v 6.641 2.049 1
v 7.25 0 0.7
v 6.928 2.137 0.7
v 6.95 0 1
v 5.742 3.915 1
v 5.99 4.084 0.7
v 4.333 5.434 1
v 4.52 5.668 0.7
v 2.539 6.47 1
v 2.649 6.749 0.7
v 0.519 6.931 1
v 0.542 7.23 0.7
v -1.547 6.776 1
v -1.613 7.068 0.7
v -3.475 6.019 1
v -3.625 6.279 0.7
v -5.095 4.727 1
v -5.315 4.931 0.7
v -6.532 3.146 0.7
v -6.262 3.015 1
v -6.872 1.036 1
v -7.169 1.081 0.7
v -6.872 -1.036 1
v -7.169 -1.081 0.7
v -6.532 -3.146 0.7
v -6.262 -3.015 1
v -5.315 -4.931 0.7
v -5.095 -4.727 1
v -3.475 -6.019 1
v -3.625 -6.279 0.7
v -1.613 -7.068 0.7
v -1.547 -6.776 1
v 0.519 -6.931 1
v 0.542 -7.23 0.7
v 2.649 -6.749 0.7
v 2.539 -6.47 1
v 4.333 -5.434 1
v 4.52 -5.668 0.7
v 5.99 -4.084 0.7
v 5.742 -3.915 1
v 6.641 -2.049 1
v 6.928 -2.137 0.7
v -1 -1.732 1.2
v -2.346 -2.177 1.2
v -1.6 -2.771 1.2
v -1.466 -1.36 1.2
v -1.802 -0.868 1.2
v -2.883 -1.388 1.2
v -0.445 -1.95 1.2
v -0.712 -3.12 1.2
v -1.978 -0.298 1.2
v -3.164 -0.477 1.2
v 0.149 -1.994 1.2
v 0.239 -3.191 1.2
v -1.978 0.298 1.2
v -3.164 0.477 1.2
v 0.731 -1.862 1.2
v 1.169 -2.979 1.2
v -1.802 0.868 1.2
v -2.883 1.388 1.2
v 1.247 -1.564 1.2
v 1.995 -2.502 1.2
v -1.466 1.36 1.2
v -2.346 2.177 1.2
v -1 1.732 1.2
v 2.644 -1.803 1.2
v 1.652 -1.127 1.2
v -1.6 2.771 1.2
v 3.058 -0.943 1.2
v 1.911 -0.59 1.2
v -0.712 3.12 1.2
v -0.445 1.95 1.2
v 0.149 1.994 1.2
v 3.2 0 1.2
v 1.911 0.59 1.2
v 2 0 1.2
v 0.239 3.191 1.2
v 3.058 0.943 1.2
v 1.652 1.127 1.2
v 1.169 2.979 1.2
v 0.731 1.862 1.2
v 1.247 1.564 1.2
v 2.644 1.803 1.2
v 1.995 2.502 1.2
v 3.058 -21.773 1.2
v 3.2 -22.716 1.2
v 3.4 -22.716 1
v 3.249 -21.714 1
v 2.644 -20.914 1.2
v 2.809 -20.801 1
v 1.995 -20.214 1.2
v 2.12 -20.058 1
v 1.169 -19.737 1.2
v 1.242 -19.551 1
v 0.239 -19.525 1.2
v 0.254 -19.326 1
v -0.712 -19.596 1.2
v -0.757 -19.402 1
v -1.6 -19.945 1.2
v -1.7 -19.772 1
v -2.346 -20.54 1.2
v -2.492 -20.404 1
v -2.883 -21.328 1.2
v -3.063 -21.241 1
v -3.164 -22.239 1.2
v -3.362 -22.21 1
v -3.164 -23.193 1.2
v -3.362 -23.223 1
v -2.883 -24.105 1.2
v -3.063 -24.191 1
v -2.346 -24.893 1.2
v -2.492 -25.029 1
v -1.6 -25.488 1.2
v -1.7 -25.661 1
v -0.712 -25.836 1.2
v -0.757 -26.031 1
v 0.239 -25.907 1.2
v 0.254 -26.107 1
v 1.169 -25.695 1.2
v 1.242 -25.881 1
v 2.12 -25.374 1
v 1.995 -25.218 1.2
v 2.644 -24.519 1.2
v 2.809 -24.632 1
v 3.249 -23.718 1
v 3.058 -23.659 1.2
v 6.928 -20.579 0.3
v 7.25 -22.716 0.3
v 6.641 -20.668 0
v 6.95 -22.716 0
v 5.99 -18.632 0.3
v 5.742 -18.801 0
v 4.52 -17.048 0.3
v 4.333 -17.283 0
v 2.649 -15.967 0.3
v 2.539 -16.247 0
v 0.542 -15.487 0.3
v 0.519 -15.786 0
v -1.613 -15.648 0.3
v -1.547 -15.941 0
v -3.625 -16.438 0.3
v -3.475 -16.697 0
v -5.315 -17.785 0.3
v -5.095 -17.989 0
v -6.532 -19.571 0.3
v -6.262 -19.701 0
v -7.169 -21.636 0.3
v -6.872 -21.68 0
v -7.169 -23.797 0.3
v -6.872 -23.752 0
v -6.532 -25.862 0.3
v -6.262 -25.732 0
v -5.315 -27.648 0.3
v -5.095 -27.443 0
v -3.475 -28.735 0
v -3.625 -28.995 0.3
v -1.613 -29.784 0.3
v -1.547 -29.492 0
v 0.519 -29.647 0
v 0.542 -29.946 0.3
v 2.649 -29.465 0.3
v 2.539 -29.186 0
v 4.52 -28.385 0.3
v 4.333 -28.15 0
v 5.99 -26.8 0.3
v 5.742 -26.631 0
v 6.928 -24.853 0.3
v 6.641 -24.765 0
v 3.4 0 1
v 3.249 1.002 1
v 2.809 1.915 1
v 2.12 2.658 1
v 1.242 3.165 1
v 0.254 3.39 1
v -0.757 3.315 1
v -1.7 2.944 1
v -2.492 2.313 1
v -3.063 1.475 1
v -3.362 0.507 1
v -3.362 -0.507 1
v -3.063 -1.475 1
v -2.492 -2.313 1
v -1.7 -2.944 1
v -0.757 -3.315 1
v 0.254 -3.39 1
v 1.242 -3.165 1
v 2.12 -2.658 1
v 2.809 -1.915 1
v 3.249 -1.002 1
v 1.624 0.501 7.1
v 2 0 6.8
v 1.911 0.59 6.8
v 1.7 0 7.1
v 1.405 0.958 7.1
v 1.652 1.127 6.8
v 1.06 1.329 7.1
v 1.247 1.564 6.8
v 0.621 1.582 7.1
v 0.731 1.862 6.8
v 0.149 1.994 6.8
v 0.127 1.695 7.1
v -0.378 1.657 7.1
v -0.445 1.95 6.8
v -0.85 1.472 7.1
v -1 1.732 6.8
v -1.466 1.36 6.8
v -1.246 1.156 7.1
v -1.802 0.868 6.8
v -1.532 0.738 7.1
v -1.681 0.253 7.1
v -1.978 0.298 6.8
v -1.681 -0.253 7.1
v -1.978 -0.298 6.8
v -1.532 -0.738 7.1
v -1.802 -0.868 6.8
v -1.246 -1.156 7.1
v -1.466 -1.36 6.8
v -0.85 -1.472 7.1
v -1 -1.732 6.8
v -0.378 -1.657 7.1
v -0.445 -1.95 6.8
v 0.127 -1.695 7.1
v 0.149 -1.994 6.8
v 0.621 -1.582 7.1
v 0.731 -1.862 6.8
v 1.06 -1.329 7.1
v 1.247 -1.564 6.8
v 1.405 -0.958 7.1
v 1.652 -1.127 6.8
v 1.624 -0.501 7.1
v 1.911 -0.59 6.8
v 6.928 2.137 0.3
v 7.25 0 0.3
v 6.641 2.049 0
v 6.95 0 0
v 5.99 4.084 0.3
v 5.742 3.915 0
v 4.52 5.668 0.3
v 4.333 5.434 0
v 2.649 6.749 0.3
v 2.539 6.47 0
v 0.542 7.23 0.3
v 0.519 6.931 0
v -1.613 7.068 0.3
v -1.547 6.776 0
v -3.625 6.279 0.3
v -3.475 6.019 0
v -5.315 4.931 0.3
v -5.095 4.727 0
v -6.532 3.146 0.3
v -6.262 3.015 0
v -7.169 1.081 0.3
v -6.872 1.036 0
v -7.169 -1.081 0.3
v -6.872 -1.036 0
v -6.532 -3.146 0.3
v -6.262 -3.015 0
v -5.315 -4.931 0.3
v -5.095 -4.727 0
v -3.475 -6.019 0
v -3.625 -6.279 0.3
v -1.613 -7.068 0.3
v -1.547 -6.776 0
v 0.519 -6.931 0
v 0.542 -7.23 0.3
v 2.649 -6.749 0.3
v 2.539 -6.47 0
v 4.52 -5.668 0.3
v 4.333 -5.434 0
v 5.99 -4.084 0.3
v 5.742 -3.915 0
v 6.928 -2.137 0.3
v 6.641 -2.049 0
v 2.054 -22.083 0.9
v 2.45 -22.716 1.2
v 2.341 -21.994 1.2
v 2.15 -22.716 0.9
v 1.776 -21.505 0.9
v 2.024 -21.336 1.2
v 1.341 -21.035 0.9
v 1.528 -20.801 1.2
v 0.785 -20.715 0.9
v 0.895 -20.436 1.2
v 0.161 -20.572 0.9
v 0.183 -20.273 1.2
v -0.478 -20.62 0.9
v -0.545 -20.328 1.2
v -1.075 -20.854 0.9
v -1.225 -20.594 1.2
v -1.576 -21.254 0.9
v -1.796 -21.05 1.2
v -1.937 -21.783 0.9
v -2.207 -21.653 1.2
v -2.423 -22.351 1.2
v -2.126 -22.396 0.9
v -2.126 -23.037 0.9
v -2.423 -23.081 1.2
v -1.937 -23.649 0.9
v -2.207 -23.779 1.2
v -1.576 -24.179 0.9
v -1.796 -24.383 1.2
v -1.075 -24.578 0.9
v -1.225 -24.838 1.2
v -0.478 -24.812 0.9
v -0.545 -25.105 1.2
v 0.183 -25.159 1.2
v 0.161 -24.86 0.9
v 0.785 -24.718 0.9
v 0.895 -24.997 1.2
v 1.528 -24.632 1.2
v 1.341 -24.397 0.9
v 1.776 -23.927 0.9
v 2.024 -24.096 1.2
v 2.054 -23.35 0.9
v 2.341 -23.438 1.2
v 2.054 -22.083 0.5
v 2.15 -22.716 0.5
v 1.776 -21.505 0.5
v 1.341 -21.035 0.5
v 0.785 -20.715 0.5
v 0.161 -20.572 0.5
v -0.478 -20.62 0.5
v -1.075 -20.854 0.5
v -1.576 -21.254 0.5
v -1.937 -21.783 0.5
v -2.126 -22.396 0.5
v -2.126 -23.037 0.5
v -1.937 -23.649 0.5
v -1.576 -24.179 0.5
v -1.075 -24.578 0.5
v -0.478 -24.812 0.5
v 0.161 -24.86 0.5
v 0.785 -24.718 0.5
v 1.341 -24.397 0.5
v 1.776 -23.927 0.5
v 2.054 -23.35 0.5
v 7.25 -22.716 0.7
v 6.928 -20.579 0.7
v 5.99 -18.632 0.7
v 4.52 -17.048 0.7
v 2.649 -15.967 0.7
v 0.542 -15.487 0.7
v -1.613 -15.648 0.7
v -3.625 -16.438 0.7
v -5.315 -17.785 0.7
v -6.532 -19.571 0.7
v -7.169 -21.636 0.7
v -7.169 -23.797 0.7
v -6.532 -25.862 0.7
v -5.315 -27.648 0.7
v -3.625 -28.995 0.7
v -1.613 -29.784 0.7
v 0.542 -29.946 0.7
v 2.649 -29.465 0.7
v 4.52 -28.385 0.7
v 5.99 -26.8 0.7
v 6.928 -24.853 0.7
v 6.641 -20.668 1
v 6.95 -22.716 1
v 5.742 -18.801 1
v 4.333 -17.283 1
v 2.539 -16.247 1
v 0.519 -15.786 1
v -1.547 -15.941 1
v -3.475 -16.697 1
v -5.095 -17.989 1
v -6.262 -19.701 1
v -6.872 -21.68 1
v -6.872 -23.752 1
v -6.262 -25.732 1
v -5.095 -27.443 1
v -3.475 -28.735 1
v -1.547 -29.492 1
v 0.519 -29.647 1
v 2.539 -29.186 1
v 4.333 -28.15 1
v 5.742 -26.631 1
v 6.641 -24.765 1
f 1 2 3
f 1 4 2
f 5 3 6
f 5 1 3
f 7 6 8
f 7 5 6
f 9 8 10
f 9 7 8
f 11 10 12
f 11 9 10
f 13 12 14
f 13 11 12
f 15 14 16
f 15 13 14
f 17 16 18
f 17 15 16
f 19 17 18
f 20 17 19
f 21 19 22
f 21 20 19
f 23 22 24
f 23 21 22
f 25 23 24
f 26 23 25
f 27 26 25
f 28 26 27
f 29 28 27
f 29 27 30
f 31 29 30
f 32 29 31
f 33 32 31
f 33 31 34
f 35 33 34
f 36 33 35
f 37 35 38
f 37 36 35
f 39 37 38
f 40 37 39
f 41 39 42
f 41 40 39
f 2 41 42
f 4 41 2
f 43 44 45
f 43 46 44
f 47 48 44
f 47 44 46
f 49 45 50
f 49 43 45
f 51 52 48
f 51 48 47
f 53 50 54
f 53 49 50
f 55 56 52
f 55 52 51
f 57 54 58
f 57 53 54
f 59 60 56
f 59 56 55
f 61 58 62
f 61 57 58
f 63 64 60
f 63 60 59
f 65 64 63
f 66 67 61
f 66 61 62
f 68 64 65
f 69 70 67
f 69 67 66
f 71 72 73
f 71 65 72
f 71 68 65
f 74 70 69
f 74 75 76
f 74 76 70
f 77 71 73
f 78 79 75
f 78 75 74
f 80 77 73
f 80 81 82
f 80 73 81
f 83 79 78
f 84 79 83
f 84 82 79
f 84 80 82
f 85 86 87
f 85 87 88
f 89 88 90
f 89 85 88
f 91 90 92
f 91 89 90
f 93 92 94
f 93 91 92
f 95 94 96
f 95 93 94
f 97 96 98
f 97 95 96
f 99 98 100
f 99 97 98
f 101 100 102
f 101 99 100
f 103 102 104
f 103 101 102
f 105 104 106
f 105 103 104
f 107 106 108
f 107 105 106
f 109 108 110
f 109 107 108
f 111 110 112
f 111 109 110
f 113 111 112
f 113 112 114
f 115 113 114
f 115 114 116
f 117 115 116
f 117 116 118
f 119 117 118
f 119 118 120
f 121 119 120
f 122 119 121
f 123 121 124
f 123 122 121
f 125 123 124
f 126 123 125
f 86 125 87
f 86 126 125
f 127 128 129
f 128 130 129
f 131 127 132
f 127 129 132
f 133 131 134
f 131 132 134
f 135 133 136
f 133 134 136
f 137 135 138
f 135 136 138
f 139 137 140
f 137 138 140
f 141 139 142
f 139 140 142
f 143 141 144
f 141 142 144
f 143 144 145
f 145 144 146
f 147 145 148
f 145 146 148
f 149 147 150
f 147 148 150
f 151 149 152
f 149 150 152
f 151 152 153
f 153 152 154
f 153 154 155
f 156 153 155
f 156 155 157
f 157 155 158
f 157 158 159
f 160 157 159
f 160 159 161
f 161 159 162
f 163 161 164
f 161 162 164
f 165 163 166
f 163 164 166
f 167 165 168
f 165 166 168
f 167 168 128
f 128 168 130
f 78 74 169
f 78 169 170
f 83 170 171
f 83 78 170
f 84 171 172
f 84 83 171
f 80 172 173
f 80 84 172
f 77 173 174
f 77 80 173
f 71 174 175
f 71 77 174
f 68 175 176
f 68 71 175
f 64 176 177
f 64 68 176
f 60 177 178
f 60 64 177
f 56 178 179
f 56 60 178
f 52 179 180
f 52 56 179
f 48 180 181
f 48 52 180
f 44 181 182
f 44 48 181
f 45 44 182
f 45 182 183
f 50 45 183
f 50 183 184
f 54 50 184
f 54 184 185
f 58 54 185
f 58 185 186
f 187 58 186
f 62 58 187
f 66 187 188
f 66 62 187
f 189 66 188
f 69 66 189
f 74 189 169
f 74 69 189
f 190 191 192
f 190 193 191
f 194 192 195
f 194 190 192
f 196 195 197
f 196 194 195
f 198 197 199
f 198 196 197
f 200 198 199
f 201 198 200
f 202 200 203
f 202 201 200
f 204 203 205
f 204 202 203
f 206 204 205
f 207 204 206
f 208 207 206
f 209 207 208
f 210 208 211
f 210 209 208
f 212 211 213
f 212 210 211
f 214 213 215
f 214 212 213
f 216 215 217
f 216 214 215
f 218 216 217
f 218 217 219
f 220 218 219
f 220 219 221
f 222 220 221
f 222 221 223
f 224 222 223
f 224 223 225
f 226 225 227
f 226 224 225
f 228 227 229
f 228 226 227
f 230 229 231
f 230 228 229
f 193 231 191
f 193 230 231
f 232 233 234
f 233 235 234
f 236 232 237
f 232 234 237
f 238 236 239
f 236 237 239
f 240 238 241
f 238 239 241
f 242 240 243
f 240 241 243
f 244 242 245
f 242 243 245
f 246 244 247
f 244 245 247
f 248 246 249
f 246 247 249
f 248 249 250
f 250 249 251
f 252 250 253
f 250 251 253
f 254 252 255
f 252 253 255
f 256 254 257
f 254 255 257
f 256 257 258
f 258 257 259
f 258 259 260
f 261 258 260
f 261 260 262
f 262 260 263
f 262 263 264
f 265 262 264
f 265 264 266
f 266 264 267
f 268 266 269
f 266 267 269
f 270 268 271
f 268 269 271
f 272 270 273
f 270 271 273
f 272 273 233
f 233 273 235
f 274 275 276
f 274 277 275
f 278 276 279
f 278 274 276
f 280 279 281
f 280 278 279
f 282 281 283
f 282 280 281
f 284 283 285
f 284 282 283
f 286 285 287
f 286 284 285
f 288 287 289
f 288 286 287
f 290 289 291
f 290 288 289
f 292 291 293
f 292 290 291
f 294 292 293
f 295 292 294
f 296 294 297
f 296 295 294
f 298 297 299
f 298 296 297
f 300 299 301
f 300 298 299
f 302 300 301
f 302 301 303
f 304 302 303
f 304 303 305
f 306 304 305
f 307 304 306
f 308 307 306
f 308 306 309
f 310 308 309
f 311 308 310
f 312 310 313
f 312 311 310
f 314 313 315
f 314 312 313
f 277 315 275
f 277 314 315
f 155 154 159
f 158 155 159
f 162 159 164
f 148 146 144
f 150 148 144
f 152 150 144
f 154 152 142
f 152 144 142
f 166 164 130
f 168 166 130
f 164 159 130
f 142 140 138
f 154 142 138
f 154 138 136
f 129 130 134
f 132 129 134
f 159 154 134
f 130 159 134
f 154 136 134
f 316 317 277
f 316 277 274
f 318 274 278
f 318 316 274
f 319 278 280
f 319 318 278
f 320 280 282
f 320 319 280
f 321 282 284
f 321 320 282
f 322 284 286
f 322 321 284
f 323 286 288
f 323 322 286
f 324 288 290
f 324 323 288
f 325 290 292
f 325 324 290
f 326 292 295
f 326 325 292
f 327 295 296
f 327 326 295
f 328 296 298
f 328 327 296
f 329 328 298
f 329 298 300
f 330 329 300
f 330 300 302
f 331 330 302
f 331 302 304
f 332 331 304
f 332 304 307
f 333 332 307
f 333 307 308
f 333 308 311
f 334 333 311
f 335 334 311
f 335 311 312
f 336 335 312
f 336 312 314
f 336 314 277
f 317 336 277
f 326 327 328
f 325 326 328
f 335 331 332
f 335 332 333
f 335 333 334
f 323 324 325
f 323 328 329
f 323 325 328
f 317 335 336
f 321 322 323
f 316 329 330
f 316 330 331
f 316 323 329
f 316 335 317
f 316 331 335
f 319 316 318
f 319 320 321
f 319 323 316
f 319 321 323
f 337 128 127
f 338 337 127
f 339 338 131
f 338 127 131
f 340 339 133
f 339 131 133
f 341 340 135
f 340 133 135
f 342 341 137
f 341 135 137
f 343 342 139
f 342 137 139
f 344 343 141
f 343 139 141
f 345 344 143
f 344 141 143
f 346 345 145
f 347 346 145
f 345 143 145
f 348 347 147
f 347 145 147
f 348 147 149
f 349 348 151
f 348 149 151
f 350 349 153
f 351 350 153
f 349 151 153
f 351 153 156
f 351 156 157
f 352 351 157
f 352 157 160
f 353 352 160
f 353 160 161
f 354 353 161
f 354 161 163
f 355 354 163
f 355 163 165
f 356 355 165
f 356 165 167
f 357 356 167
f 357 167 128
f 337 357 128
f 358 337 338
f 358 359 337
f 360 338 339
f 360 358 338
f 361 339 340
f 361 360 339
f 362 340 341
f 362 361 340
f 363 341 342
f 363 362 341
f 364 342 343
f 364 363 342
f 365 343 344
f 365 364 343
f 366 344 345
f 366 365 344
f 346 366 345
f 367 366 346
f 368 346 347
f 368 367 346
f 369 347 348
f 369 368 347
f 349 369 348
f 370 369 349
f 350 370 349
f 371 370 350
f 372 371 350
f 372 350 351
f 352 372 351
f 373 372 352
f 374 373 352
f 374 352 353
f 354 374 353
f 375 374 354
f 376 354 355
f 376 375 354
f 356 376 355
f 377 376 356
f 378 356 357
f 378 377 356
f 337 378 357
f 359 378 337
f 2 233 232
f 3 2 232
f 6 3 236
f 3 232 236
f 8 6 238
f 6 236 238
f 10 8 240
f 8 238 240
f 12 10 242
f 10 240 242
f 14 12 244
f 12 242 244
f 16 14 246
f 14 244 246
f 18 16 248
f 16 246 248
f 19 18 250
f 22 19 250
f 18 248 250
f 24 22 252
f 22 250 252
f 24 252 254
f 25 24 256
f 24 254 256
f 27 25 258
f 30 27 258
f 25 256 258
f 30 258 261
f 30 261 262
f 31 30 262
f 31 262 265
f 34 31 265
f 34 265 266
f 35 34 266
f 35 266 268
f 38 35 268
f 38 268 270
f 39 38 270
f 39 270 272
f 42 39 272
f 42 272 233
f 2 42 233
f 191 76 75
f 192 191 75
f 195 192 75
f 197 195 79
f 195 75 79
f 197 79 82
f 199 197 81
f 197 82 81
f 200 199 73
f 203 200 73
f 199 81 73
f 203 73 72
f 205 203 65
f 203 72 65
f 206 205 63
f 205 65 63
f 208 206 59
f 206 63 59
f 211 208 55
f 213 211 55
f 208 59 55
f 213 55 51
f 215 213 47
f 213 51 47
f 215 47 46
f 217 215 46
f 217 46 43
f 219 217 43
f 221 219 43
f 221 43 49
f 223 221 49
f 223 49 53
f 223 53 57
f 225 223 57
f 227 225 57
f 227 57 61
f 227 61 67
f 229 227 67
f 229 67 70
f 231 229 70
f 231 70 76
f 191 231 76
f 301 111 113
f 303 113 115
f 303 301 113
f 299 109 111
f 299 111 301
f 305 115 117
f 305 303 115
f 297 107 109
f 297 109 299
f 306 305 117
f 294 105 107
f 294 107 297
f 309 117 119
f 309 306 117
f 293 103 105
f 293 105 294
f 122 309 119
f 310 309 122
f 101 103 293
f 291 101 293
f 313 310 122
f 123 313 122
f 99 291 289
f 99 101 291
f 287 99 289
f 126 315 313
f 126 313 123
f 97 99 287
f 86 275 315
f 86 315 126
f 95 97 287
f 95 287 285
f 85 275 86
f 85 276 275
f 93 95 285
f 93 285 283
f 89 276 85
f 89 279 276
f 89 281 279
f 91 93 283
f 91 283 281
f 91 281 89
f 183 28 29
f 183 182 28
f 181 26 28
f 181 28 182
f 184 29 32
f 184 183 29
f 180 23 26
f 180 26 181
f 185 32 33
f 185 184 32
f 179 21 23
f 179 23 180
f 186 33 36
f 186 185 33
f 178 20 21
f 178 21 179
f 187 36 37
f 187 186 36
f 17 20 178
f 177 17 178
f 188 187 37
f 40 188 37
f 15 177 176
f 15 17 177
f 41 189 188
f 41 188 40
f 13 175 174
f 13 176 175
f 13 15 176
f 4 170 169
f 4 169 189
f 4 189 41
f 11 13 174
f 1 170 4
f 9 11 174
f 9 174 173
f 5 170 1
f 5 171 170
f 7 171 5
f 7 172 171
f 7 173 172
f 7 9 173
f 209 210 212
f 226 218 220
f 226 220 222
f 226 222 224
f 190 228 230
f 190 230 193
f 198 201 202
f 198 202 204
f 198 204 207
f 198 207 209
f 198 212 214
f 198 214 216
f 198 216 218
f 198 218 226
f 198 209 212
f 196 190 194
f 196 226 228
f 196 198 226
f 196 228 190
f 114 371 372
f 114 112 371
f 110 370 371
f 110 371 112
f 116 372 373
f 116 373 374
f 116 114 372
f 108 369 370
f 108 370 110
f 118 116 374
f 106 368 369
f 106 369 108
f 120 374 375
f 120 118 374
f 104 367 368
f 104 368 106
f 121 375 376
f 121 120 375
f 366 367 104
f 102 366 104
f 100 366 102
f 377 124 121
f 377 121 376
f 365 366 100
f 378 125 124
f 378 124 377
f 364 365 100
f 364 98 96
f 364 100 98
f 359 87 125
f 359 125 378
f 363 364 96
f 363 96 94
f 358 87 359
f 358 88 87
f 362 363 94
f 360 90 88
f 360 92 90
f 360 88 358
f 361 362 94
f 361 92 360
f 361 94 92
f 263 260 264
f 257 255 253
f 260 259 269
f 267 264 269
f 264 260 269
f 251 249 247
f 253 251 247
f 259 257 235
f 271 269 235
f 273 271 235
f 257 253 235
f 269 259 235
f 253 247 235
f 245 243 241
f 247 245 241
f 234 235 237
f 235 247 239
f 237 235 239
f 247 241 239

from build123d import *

# Parameters (mm, degrees)
F0_R     = 7.25
F0_R_2   = 3.1
F1_DEPTH = 1
F0_R_3   = 2
F2_DEPTH = 1.2
F0_R_4   = 2.15
F3_DEPTH = 7.1
F4_DEPTH = 0.5


# Not quite as in the source:
# - a fillet or chamfer that OpenCascade refuses, or shapes differently, is made with other operations: its cross-section is extruded or revolved along the edge and cut away or added


with BuildPart() as f1:
    # F0 (on Top) → F1 (new body)
    with BuildSketch(Plane.XY):
        Circle(F0_R)
        Circle(F0_R_2, mode=Mode.SUBTRACT)
    extrude(amount=F1_DEPTH)

    # F0 (on Top) → F2 (join)
    with BuildSketch(Plane.XY):
        Circle(F0_R_2)
        Circle(F0_R_3, mode=Mode.SUBTRACT)
    extrude(amount=F2_DEPTH)

    # F0 (on Top) → F3 (join)
    with BuildSketch(Plane.XY):
        Circle(F0_R_3)
    extrude(amount=F3_DEPTH)

    # F5#2: chamfer of 0.3 on 4 edges, made by hand


with BuildPart() as f1b:
    # F0 (on Top) → F1, piece 2 (new body)
    with BuildSketch(Plane.XY):
        with Locations((0, -22.7162558585)):
            Circle(F0_R)
        with Locations((0, -22.7162558585)):
            Circle(F0_R_2, mode=Mode.SUBTRACT)
    extrude(amount=F1_DEPTH)

    # F0 (on Top) → F2, piece 2 (join)
    with BuildSketch(Plane.XY):
        with Locations((0, -22.7162558585)):
            Circle(F0_R_2)
        with Locations((0, -22.7162558585)):
            Circle(F0_R_4, mode=Mode.SUBTRACT)
    extrude(amount=F2_DEPTH)

    # F0 (on Top) → F4 (join)
    with BuildSketch(Plane.XY):
        with Locations((0, -22.7162558585)):
            Circle(F0_R_4)
    extrude(amount=F4_DEPTH)

    # F5: chamfer of 0.3 on 4 edges, made by hand


with BuildPart() as f5_tool2:
    # F5_s3 → F5_t4 (revolve)
    with BuildSketch(Plane.XZ.offset(22.7162558585)):
        Polygon((3.4, 1), (3.1, 1.3), (3.1, 1), align=None)
    revolve(axis=Axis((0, -22.7162558585, 1), (0, 0, 1)))

    split(bisect_by=Plane.XY.offset(1.2), keep=Keep.BOTTOM)


with BuildPart() as f1b_1:
    add(f1b.part)

    # F5_t1: union F5_tool2
    add(f5_tool2.part)

    # F5_s6 → F5_t7 (revolve, cut)
    with BuildSketch(Plane.XZ.offset(22.7162558585)):
        Polygon((7.25, 0.3), (6.95, 0), (7.25, 0), align=None)
    revolve(axis=Axis((0, -22.7162558585, 0), (0, 0, 1)), mode=Mode.SUBTRACT)

    # F5_s8 → F5_t9 (revolve, cut)
    with BuildSketch(Plane.XZ.offset(22.7162558585)):
        Polygon((7.25, 0.7), (6.95, 1), (7.25, 1), align=None)
    revolve(axis=Axis((0, -22.7162558585, 1), (0, 0, 1)), mode=Mode.SUBTRACT)

    # F5_s10 → F5_t11 (revolve, cut)
    with BuildSketch(Plane.XZ.offset(22.7162558585)):
        Polygon((2.45, 1.2), (2.15, 0.9), (2.15, 1.2), align=None)
    revolve(axis=Axis((0, -22.7162558585, 1.2), (0, 0, 1)), mode=Mode.SUBTRACT)


with BuildPart() as f5_2_tool2:
    # F5_2_s3 → F5_2_t4 (revolve)
    with BuildSketch(Plane.XZ):
        Polygon((3.4, 1), (3.1, 1.3), (3.1, 1), align=None)
    revolve(axis=Axis((0, 0, 1), (0, 0, 1)))

    split(bisect_by=Plane.XY.offset(1.2), keep=Keep.BOTTOM)


with BuildPart() as f1_1:
    add(f1.part)

    # F5_2_t1: union F5_2_tool2
    add(f5_2_tool2.part)

    # F5_2_s6 → F5_2_t7 (revolve, cut)
    with BuildSketch(Plane.XZ):
        Polygon((7.25, 0.3), (6.95, 0), (7.25, 0), align=None)
    revolve(axis=Axis((0, 0, 0), (0, 0, 1)), mode=Mode.SUBTRACT)

    # F5_2_s8 → F5_2_t9 (revolve, cut)
    with BuildSketch(Plane.XZ):
        Polygon((7.25, 0.7), (6.95, 1), (7.25, 1), align=None)
    revolve(axis=Axis((0, 0, 1), (0, 0, 1)), mode=Mode.SUBTRACT)

    # F5_2_s10 → F5_2_t11 (revolve, cut)
    with BuildSketch(Plane.XZ):
        Polygon((2, 6.8), (1.7, 7.1), (2, 7.1), align=None)
    revolve(axis=Axis((0, 0, 7.1), (0, 0, 1)), mode=Mode.SUBTRACT)


solid = Compound([f1b_1.part, f1_1.part])
